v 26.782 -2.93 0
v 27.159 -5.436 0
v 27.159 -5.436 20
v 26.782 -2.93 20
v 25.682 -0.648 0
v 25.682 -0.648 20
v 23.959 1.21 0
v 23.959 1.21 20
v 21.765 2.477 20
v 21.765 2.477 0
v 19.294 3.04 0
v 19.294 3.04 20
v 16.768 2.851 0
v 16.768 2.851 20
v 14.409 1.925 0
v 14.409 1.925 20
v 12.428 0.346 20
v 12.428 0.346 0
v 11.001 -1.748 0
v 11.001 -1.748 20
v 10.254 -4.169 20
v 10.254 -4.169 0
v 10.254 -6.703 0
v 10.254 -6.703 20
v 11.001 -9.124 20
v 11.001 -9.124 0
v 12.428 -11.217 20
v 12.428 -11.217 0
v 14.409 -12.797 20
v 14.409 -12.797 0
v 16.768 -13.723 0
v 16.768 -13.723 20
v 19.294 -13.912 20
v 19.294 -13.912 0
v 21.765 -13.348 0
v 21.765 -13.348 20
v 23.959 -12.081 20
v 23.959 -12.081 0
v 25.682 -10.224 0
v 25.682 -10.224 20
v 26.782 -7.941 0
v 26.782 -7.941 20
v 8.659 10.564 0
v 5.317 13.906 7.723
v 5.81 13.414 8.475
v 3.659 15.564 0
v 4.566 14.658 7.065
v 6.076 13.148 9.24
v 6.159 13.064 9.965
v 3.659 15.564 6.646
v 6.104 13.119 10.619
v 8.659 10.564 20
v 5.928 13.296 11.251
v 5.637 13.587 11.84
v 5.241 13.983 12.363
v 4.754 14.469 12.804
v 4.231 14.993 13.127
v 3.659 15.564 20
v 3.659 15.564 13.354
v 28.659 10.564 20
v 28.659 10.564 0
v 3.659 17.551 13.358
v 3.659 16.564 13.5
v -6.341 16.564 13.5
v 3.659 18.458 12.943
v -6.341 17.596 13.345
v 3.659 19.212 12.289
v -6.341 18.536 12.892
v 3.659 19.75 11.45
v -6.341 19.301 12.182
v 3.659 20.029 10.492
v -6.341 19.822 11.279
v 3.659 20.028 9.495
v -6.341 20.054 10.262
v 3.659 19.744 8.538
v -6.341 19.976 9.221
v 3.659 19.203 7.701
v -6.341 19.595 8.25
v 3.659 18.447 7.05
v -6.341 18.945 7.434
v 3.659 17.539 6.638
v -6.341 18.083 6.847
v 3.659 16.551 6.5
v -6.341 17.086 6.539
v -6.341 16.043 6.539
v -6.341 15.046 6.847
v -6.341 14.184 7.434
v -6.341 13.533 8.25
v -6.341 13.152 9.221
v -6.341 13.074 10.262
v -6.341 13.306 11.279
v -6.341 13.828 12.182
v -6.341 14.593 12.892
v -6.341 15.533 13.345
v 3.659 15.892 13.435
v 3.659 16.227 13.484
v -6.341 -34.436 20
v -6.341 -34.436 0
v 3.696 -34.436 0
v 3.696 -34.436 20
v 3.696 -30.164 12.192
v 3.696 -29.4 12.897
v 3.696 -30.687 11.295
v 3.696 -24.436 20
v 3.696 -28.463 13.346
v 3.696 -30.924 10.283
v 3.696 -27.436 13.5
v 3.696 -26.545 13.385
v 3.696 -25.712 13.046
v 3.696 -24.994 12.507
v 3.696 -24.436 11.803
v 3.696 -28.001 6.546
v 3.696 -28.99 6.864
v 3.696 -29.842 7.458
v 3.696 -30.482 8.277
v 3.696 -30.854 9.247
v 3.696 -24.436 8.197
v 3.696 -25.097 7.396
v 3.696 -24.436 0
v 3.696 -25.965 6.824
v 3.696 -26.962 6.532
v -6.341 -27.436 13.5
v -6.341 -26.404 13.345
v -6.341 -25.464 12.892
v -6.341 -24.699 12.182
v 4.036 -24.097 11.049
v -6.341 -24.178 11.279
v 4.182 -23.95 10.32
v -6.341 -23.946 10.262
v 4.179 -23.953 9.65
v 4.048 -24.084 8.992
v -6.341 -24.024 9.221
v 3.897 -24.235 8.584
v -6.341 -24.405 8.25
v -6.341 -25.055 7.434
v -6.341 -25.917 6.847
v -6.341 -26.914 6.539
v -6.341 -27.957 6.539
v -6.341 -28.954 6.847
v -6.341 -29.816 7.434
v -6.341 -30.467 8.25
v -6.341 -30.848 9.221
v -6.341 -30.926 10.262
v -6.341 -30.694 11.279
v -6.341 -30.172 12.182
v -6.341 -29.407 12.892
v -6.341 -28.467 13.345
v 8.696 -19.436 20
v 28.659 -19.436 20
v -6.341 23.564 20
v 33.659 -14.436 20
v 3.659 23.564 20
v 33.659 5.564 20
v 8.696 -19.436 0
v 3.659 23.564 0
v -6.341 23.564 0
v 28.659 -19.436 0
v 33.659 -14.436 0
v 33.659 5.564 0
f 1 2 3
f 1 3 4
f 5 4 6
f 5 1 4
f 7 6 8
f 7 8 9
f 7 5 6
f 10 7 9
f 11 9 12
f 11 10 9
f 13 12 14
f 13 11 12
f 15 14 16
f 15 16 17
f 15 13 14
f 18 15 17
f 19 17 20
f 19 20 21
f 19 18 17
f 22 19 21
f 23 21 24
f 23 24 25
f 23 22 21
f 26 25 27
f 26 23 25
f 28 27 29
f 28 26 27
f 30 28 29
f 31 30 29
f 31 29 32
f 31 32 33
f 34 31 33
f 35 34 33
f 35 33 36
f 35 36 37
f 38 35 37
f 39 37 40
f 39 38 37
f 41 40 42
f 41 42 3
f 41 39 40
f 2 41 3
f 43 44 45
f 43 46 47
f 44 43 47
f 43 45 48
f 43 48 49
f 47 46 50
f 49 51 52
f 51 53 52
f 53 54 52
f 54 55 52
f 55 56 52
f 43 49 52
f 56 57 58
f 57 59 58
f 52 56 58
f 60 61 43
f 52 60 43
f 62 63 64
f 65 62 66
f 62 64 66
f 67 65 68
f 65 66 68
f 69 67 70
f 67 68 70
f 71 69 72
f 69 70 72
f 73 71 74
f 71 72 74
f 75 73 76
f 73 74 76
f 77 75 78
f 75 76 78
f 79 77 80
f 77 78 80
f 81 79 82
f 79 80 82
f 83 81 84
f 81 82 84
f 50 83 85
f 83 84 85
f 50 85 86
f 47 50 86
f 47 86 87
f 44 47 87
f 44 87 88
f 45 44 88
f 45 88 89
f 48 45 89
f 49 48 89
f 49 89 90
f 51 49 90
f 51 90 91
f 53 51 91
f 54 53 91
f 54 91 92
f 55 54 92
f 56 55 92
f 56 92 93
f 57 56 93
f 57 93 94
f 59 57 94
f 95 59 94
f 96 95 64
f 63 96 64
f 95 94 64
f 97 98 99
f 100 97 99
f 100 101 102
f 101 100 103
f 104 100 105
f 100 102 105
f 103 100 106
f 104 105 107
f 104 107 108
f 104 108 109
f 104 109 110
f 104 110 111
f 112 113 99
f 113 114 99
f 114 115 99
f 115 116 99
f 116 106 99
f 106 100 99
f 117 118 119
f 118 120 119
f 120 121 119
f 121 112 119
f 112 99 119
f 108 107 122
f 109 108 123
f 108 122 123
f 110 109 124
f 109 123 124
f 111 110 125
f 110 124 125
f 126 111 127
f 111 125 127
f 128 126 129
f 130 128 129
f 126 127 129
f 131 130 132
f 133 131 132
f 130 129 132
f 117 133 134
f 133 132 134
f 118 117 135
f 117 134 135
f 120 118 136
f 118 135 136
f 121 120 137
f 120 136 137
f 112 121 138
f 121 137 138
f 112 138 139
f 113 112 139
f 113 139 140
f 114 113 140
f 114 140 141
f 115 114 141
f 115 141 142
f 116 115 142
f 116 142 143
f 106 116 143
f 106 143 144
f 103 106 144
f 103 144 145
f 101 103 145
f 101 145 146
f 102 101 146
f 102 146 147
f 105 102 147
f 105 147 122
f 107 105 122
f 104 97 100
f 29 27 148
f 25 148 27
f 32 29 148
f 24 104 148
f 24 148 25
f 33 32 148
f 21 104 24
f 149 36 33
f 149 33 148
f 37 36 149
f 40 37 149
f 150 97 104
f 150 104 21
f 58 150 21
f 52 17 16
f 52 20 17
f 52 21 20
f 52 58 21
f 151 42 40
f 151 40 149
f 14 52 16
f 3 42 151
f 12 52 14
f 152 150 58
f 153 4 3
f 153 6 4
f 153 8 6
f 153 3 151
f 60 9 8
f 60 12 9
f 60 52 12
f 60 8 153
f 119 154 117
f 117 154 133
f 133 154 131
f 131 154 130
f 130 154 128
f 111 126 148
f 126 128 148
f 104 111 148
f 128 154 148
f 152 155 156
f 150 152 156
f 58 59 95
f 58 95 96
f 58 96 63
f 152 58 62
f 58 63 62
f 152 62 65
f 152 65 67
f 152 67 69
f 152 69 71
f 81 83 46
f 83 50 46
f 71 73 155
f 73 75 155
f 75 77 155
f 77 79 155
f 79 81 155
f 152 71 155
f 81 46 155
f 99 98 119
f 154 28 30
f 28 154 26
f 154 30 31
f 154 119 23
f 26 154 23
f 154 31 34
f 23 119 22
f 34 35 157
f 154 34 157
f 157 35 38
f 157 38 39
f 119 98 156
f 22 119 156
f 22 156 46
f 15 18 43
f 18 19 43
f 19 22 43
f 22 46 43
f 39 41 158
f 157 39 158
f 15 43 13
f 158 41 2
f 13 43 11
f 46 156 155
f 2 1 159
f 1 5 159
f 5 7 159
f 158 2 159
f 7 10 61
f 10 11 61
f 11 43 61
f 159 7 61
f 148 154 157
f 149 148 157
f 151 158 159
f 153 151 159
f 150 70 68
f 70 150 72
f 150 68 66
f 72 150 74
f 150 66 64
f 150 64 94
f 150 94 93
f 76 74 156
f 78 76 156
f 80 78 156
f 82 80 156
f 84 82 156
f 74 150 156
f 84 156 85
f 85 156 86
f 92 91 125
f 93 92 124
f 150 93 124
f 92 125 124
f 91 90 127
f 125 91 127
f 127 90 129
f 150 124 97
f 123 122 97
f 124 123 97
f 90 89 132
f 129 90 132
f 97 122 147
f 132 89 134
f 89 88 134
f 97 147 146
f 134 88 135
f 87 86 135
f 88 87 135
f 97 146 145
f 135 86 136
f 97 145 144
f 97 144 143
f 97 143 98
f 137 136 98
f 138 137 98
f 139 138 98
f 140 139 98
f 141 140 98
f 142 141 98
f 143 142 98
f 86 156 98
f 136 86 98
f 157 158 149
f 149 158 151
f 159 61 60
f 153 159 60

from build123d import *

# Parameters (mm, degrees)
SKETCH1_R           = 8.5
BOSS_EXTRUDE1_DEPTH = 20
CHAMFER1_SIZE       = 5
SKETCH2_R           = 3.5
CUT_EXTRUDE1_DEPTH  = 20
LPATTERN1_COUNT     = 200
LPATTERN1_PITCH     = 44


with BuildPart() as part:
    # Sketch1 → Boss-Extrude1 (new body)
    with BuildSketch(Plane.XY):
        Polygon((3.696498054, -34.435797665), (3.696498054, -19.435797665), (33.659197457, -19.435797665), (33.659197457, 10.564202335), (3.659197457, 10.564202335), (3.659197457, 23.564202335), (-6.340802543, 23.564202335), (-6.340802543, -34.435797665), align=None)
        with Locations((18.659197457, -5.435797665)):
            Circle(SKETCH1_R, mode=Mode.SUBTRACT)
    extrude(amount=BOSS_EXTRUDE1_DEPTH)

    # Chamfer1
    chamfer1_edges = [part.edges().sort_by_distance(p)[0] for p in [
        (3.659197457, 10.564202335, 10),
        (33.659197457, 10.564202335, 10),
        (33.659197457, -19.435797665, 10),
        (3.696498054, -19.435797665, 10),
    ]]
    chamfer(chamfer1_edges, length=CHAMFER1_SIZE)

    # Sketch2 → Cut-Extrude1 (cut)
    with BuildSketch(Plane.ZY.offset(6.340802543)):
        with Locations((10, 16.564202335)):
            Circle(SKETCH2_R)
    cut_extrude1 = extrude(amount=-CUT_EXTRUDE1_DEPTH, mode=Mode.SUBTRACT)

    # LPattern1: Cut-Extrude1 ×200
    with Locations(*[(0, -i * LPATTERN1_PITCH, 0) for i in range(1, LPATTERN1_COUNT)]):
        add(cut_extrude1, mode=Mode.SUBTRACT)


solid = part.part
